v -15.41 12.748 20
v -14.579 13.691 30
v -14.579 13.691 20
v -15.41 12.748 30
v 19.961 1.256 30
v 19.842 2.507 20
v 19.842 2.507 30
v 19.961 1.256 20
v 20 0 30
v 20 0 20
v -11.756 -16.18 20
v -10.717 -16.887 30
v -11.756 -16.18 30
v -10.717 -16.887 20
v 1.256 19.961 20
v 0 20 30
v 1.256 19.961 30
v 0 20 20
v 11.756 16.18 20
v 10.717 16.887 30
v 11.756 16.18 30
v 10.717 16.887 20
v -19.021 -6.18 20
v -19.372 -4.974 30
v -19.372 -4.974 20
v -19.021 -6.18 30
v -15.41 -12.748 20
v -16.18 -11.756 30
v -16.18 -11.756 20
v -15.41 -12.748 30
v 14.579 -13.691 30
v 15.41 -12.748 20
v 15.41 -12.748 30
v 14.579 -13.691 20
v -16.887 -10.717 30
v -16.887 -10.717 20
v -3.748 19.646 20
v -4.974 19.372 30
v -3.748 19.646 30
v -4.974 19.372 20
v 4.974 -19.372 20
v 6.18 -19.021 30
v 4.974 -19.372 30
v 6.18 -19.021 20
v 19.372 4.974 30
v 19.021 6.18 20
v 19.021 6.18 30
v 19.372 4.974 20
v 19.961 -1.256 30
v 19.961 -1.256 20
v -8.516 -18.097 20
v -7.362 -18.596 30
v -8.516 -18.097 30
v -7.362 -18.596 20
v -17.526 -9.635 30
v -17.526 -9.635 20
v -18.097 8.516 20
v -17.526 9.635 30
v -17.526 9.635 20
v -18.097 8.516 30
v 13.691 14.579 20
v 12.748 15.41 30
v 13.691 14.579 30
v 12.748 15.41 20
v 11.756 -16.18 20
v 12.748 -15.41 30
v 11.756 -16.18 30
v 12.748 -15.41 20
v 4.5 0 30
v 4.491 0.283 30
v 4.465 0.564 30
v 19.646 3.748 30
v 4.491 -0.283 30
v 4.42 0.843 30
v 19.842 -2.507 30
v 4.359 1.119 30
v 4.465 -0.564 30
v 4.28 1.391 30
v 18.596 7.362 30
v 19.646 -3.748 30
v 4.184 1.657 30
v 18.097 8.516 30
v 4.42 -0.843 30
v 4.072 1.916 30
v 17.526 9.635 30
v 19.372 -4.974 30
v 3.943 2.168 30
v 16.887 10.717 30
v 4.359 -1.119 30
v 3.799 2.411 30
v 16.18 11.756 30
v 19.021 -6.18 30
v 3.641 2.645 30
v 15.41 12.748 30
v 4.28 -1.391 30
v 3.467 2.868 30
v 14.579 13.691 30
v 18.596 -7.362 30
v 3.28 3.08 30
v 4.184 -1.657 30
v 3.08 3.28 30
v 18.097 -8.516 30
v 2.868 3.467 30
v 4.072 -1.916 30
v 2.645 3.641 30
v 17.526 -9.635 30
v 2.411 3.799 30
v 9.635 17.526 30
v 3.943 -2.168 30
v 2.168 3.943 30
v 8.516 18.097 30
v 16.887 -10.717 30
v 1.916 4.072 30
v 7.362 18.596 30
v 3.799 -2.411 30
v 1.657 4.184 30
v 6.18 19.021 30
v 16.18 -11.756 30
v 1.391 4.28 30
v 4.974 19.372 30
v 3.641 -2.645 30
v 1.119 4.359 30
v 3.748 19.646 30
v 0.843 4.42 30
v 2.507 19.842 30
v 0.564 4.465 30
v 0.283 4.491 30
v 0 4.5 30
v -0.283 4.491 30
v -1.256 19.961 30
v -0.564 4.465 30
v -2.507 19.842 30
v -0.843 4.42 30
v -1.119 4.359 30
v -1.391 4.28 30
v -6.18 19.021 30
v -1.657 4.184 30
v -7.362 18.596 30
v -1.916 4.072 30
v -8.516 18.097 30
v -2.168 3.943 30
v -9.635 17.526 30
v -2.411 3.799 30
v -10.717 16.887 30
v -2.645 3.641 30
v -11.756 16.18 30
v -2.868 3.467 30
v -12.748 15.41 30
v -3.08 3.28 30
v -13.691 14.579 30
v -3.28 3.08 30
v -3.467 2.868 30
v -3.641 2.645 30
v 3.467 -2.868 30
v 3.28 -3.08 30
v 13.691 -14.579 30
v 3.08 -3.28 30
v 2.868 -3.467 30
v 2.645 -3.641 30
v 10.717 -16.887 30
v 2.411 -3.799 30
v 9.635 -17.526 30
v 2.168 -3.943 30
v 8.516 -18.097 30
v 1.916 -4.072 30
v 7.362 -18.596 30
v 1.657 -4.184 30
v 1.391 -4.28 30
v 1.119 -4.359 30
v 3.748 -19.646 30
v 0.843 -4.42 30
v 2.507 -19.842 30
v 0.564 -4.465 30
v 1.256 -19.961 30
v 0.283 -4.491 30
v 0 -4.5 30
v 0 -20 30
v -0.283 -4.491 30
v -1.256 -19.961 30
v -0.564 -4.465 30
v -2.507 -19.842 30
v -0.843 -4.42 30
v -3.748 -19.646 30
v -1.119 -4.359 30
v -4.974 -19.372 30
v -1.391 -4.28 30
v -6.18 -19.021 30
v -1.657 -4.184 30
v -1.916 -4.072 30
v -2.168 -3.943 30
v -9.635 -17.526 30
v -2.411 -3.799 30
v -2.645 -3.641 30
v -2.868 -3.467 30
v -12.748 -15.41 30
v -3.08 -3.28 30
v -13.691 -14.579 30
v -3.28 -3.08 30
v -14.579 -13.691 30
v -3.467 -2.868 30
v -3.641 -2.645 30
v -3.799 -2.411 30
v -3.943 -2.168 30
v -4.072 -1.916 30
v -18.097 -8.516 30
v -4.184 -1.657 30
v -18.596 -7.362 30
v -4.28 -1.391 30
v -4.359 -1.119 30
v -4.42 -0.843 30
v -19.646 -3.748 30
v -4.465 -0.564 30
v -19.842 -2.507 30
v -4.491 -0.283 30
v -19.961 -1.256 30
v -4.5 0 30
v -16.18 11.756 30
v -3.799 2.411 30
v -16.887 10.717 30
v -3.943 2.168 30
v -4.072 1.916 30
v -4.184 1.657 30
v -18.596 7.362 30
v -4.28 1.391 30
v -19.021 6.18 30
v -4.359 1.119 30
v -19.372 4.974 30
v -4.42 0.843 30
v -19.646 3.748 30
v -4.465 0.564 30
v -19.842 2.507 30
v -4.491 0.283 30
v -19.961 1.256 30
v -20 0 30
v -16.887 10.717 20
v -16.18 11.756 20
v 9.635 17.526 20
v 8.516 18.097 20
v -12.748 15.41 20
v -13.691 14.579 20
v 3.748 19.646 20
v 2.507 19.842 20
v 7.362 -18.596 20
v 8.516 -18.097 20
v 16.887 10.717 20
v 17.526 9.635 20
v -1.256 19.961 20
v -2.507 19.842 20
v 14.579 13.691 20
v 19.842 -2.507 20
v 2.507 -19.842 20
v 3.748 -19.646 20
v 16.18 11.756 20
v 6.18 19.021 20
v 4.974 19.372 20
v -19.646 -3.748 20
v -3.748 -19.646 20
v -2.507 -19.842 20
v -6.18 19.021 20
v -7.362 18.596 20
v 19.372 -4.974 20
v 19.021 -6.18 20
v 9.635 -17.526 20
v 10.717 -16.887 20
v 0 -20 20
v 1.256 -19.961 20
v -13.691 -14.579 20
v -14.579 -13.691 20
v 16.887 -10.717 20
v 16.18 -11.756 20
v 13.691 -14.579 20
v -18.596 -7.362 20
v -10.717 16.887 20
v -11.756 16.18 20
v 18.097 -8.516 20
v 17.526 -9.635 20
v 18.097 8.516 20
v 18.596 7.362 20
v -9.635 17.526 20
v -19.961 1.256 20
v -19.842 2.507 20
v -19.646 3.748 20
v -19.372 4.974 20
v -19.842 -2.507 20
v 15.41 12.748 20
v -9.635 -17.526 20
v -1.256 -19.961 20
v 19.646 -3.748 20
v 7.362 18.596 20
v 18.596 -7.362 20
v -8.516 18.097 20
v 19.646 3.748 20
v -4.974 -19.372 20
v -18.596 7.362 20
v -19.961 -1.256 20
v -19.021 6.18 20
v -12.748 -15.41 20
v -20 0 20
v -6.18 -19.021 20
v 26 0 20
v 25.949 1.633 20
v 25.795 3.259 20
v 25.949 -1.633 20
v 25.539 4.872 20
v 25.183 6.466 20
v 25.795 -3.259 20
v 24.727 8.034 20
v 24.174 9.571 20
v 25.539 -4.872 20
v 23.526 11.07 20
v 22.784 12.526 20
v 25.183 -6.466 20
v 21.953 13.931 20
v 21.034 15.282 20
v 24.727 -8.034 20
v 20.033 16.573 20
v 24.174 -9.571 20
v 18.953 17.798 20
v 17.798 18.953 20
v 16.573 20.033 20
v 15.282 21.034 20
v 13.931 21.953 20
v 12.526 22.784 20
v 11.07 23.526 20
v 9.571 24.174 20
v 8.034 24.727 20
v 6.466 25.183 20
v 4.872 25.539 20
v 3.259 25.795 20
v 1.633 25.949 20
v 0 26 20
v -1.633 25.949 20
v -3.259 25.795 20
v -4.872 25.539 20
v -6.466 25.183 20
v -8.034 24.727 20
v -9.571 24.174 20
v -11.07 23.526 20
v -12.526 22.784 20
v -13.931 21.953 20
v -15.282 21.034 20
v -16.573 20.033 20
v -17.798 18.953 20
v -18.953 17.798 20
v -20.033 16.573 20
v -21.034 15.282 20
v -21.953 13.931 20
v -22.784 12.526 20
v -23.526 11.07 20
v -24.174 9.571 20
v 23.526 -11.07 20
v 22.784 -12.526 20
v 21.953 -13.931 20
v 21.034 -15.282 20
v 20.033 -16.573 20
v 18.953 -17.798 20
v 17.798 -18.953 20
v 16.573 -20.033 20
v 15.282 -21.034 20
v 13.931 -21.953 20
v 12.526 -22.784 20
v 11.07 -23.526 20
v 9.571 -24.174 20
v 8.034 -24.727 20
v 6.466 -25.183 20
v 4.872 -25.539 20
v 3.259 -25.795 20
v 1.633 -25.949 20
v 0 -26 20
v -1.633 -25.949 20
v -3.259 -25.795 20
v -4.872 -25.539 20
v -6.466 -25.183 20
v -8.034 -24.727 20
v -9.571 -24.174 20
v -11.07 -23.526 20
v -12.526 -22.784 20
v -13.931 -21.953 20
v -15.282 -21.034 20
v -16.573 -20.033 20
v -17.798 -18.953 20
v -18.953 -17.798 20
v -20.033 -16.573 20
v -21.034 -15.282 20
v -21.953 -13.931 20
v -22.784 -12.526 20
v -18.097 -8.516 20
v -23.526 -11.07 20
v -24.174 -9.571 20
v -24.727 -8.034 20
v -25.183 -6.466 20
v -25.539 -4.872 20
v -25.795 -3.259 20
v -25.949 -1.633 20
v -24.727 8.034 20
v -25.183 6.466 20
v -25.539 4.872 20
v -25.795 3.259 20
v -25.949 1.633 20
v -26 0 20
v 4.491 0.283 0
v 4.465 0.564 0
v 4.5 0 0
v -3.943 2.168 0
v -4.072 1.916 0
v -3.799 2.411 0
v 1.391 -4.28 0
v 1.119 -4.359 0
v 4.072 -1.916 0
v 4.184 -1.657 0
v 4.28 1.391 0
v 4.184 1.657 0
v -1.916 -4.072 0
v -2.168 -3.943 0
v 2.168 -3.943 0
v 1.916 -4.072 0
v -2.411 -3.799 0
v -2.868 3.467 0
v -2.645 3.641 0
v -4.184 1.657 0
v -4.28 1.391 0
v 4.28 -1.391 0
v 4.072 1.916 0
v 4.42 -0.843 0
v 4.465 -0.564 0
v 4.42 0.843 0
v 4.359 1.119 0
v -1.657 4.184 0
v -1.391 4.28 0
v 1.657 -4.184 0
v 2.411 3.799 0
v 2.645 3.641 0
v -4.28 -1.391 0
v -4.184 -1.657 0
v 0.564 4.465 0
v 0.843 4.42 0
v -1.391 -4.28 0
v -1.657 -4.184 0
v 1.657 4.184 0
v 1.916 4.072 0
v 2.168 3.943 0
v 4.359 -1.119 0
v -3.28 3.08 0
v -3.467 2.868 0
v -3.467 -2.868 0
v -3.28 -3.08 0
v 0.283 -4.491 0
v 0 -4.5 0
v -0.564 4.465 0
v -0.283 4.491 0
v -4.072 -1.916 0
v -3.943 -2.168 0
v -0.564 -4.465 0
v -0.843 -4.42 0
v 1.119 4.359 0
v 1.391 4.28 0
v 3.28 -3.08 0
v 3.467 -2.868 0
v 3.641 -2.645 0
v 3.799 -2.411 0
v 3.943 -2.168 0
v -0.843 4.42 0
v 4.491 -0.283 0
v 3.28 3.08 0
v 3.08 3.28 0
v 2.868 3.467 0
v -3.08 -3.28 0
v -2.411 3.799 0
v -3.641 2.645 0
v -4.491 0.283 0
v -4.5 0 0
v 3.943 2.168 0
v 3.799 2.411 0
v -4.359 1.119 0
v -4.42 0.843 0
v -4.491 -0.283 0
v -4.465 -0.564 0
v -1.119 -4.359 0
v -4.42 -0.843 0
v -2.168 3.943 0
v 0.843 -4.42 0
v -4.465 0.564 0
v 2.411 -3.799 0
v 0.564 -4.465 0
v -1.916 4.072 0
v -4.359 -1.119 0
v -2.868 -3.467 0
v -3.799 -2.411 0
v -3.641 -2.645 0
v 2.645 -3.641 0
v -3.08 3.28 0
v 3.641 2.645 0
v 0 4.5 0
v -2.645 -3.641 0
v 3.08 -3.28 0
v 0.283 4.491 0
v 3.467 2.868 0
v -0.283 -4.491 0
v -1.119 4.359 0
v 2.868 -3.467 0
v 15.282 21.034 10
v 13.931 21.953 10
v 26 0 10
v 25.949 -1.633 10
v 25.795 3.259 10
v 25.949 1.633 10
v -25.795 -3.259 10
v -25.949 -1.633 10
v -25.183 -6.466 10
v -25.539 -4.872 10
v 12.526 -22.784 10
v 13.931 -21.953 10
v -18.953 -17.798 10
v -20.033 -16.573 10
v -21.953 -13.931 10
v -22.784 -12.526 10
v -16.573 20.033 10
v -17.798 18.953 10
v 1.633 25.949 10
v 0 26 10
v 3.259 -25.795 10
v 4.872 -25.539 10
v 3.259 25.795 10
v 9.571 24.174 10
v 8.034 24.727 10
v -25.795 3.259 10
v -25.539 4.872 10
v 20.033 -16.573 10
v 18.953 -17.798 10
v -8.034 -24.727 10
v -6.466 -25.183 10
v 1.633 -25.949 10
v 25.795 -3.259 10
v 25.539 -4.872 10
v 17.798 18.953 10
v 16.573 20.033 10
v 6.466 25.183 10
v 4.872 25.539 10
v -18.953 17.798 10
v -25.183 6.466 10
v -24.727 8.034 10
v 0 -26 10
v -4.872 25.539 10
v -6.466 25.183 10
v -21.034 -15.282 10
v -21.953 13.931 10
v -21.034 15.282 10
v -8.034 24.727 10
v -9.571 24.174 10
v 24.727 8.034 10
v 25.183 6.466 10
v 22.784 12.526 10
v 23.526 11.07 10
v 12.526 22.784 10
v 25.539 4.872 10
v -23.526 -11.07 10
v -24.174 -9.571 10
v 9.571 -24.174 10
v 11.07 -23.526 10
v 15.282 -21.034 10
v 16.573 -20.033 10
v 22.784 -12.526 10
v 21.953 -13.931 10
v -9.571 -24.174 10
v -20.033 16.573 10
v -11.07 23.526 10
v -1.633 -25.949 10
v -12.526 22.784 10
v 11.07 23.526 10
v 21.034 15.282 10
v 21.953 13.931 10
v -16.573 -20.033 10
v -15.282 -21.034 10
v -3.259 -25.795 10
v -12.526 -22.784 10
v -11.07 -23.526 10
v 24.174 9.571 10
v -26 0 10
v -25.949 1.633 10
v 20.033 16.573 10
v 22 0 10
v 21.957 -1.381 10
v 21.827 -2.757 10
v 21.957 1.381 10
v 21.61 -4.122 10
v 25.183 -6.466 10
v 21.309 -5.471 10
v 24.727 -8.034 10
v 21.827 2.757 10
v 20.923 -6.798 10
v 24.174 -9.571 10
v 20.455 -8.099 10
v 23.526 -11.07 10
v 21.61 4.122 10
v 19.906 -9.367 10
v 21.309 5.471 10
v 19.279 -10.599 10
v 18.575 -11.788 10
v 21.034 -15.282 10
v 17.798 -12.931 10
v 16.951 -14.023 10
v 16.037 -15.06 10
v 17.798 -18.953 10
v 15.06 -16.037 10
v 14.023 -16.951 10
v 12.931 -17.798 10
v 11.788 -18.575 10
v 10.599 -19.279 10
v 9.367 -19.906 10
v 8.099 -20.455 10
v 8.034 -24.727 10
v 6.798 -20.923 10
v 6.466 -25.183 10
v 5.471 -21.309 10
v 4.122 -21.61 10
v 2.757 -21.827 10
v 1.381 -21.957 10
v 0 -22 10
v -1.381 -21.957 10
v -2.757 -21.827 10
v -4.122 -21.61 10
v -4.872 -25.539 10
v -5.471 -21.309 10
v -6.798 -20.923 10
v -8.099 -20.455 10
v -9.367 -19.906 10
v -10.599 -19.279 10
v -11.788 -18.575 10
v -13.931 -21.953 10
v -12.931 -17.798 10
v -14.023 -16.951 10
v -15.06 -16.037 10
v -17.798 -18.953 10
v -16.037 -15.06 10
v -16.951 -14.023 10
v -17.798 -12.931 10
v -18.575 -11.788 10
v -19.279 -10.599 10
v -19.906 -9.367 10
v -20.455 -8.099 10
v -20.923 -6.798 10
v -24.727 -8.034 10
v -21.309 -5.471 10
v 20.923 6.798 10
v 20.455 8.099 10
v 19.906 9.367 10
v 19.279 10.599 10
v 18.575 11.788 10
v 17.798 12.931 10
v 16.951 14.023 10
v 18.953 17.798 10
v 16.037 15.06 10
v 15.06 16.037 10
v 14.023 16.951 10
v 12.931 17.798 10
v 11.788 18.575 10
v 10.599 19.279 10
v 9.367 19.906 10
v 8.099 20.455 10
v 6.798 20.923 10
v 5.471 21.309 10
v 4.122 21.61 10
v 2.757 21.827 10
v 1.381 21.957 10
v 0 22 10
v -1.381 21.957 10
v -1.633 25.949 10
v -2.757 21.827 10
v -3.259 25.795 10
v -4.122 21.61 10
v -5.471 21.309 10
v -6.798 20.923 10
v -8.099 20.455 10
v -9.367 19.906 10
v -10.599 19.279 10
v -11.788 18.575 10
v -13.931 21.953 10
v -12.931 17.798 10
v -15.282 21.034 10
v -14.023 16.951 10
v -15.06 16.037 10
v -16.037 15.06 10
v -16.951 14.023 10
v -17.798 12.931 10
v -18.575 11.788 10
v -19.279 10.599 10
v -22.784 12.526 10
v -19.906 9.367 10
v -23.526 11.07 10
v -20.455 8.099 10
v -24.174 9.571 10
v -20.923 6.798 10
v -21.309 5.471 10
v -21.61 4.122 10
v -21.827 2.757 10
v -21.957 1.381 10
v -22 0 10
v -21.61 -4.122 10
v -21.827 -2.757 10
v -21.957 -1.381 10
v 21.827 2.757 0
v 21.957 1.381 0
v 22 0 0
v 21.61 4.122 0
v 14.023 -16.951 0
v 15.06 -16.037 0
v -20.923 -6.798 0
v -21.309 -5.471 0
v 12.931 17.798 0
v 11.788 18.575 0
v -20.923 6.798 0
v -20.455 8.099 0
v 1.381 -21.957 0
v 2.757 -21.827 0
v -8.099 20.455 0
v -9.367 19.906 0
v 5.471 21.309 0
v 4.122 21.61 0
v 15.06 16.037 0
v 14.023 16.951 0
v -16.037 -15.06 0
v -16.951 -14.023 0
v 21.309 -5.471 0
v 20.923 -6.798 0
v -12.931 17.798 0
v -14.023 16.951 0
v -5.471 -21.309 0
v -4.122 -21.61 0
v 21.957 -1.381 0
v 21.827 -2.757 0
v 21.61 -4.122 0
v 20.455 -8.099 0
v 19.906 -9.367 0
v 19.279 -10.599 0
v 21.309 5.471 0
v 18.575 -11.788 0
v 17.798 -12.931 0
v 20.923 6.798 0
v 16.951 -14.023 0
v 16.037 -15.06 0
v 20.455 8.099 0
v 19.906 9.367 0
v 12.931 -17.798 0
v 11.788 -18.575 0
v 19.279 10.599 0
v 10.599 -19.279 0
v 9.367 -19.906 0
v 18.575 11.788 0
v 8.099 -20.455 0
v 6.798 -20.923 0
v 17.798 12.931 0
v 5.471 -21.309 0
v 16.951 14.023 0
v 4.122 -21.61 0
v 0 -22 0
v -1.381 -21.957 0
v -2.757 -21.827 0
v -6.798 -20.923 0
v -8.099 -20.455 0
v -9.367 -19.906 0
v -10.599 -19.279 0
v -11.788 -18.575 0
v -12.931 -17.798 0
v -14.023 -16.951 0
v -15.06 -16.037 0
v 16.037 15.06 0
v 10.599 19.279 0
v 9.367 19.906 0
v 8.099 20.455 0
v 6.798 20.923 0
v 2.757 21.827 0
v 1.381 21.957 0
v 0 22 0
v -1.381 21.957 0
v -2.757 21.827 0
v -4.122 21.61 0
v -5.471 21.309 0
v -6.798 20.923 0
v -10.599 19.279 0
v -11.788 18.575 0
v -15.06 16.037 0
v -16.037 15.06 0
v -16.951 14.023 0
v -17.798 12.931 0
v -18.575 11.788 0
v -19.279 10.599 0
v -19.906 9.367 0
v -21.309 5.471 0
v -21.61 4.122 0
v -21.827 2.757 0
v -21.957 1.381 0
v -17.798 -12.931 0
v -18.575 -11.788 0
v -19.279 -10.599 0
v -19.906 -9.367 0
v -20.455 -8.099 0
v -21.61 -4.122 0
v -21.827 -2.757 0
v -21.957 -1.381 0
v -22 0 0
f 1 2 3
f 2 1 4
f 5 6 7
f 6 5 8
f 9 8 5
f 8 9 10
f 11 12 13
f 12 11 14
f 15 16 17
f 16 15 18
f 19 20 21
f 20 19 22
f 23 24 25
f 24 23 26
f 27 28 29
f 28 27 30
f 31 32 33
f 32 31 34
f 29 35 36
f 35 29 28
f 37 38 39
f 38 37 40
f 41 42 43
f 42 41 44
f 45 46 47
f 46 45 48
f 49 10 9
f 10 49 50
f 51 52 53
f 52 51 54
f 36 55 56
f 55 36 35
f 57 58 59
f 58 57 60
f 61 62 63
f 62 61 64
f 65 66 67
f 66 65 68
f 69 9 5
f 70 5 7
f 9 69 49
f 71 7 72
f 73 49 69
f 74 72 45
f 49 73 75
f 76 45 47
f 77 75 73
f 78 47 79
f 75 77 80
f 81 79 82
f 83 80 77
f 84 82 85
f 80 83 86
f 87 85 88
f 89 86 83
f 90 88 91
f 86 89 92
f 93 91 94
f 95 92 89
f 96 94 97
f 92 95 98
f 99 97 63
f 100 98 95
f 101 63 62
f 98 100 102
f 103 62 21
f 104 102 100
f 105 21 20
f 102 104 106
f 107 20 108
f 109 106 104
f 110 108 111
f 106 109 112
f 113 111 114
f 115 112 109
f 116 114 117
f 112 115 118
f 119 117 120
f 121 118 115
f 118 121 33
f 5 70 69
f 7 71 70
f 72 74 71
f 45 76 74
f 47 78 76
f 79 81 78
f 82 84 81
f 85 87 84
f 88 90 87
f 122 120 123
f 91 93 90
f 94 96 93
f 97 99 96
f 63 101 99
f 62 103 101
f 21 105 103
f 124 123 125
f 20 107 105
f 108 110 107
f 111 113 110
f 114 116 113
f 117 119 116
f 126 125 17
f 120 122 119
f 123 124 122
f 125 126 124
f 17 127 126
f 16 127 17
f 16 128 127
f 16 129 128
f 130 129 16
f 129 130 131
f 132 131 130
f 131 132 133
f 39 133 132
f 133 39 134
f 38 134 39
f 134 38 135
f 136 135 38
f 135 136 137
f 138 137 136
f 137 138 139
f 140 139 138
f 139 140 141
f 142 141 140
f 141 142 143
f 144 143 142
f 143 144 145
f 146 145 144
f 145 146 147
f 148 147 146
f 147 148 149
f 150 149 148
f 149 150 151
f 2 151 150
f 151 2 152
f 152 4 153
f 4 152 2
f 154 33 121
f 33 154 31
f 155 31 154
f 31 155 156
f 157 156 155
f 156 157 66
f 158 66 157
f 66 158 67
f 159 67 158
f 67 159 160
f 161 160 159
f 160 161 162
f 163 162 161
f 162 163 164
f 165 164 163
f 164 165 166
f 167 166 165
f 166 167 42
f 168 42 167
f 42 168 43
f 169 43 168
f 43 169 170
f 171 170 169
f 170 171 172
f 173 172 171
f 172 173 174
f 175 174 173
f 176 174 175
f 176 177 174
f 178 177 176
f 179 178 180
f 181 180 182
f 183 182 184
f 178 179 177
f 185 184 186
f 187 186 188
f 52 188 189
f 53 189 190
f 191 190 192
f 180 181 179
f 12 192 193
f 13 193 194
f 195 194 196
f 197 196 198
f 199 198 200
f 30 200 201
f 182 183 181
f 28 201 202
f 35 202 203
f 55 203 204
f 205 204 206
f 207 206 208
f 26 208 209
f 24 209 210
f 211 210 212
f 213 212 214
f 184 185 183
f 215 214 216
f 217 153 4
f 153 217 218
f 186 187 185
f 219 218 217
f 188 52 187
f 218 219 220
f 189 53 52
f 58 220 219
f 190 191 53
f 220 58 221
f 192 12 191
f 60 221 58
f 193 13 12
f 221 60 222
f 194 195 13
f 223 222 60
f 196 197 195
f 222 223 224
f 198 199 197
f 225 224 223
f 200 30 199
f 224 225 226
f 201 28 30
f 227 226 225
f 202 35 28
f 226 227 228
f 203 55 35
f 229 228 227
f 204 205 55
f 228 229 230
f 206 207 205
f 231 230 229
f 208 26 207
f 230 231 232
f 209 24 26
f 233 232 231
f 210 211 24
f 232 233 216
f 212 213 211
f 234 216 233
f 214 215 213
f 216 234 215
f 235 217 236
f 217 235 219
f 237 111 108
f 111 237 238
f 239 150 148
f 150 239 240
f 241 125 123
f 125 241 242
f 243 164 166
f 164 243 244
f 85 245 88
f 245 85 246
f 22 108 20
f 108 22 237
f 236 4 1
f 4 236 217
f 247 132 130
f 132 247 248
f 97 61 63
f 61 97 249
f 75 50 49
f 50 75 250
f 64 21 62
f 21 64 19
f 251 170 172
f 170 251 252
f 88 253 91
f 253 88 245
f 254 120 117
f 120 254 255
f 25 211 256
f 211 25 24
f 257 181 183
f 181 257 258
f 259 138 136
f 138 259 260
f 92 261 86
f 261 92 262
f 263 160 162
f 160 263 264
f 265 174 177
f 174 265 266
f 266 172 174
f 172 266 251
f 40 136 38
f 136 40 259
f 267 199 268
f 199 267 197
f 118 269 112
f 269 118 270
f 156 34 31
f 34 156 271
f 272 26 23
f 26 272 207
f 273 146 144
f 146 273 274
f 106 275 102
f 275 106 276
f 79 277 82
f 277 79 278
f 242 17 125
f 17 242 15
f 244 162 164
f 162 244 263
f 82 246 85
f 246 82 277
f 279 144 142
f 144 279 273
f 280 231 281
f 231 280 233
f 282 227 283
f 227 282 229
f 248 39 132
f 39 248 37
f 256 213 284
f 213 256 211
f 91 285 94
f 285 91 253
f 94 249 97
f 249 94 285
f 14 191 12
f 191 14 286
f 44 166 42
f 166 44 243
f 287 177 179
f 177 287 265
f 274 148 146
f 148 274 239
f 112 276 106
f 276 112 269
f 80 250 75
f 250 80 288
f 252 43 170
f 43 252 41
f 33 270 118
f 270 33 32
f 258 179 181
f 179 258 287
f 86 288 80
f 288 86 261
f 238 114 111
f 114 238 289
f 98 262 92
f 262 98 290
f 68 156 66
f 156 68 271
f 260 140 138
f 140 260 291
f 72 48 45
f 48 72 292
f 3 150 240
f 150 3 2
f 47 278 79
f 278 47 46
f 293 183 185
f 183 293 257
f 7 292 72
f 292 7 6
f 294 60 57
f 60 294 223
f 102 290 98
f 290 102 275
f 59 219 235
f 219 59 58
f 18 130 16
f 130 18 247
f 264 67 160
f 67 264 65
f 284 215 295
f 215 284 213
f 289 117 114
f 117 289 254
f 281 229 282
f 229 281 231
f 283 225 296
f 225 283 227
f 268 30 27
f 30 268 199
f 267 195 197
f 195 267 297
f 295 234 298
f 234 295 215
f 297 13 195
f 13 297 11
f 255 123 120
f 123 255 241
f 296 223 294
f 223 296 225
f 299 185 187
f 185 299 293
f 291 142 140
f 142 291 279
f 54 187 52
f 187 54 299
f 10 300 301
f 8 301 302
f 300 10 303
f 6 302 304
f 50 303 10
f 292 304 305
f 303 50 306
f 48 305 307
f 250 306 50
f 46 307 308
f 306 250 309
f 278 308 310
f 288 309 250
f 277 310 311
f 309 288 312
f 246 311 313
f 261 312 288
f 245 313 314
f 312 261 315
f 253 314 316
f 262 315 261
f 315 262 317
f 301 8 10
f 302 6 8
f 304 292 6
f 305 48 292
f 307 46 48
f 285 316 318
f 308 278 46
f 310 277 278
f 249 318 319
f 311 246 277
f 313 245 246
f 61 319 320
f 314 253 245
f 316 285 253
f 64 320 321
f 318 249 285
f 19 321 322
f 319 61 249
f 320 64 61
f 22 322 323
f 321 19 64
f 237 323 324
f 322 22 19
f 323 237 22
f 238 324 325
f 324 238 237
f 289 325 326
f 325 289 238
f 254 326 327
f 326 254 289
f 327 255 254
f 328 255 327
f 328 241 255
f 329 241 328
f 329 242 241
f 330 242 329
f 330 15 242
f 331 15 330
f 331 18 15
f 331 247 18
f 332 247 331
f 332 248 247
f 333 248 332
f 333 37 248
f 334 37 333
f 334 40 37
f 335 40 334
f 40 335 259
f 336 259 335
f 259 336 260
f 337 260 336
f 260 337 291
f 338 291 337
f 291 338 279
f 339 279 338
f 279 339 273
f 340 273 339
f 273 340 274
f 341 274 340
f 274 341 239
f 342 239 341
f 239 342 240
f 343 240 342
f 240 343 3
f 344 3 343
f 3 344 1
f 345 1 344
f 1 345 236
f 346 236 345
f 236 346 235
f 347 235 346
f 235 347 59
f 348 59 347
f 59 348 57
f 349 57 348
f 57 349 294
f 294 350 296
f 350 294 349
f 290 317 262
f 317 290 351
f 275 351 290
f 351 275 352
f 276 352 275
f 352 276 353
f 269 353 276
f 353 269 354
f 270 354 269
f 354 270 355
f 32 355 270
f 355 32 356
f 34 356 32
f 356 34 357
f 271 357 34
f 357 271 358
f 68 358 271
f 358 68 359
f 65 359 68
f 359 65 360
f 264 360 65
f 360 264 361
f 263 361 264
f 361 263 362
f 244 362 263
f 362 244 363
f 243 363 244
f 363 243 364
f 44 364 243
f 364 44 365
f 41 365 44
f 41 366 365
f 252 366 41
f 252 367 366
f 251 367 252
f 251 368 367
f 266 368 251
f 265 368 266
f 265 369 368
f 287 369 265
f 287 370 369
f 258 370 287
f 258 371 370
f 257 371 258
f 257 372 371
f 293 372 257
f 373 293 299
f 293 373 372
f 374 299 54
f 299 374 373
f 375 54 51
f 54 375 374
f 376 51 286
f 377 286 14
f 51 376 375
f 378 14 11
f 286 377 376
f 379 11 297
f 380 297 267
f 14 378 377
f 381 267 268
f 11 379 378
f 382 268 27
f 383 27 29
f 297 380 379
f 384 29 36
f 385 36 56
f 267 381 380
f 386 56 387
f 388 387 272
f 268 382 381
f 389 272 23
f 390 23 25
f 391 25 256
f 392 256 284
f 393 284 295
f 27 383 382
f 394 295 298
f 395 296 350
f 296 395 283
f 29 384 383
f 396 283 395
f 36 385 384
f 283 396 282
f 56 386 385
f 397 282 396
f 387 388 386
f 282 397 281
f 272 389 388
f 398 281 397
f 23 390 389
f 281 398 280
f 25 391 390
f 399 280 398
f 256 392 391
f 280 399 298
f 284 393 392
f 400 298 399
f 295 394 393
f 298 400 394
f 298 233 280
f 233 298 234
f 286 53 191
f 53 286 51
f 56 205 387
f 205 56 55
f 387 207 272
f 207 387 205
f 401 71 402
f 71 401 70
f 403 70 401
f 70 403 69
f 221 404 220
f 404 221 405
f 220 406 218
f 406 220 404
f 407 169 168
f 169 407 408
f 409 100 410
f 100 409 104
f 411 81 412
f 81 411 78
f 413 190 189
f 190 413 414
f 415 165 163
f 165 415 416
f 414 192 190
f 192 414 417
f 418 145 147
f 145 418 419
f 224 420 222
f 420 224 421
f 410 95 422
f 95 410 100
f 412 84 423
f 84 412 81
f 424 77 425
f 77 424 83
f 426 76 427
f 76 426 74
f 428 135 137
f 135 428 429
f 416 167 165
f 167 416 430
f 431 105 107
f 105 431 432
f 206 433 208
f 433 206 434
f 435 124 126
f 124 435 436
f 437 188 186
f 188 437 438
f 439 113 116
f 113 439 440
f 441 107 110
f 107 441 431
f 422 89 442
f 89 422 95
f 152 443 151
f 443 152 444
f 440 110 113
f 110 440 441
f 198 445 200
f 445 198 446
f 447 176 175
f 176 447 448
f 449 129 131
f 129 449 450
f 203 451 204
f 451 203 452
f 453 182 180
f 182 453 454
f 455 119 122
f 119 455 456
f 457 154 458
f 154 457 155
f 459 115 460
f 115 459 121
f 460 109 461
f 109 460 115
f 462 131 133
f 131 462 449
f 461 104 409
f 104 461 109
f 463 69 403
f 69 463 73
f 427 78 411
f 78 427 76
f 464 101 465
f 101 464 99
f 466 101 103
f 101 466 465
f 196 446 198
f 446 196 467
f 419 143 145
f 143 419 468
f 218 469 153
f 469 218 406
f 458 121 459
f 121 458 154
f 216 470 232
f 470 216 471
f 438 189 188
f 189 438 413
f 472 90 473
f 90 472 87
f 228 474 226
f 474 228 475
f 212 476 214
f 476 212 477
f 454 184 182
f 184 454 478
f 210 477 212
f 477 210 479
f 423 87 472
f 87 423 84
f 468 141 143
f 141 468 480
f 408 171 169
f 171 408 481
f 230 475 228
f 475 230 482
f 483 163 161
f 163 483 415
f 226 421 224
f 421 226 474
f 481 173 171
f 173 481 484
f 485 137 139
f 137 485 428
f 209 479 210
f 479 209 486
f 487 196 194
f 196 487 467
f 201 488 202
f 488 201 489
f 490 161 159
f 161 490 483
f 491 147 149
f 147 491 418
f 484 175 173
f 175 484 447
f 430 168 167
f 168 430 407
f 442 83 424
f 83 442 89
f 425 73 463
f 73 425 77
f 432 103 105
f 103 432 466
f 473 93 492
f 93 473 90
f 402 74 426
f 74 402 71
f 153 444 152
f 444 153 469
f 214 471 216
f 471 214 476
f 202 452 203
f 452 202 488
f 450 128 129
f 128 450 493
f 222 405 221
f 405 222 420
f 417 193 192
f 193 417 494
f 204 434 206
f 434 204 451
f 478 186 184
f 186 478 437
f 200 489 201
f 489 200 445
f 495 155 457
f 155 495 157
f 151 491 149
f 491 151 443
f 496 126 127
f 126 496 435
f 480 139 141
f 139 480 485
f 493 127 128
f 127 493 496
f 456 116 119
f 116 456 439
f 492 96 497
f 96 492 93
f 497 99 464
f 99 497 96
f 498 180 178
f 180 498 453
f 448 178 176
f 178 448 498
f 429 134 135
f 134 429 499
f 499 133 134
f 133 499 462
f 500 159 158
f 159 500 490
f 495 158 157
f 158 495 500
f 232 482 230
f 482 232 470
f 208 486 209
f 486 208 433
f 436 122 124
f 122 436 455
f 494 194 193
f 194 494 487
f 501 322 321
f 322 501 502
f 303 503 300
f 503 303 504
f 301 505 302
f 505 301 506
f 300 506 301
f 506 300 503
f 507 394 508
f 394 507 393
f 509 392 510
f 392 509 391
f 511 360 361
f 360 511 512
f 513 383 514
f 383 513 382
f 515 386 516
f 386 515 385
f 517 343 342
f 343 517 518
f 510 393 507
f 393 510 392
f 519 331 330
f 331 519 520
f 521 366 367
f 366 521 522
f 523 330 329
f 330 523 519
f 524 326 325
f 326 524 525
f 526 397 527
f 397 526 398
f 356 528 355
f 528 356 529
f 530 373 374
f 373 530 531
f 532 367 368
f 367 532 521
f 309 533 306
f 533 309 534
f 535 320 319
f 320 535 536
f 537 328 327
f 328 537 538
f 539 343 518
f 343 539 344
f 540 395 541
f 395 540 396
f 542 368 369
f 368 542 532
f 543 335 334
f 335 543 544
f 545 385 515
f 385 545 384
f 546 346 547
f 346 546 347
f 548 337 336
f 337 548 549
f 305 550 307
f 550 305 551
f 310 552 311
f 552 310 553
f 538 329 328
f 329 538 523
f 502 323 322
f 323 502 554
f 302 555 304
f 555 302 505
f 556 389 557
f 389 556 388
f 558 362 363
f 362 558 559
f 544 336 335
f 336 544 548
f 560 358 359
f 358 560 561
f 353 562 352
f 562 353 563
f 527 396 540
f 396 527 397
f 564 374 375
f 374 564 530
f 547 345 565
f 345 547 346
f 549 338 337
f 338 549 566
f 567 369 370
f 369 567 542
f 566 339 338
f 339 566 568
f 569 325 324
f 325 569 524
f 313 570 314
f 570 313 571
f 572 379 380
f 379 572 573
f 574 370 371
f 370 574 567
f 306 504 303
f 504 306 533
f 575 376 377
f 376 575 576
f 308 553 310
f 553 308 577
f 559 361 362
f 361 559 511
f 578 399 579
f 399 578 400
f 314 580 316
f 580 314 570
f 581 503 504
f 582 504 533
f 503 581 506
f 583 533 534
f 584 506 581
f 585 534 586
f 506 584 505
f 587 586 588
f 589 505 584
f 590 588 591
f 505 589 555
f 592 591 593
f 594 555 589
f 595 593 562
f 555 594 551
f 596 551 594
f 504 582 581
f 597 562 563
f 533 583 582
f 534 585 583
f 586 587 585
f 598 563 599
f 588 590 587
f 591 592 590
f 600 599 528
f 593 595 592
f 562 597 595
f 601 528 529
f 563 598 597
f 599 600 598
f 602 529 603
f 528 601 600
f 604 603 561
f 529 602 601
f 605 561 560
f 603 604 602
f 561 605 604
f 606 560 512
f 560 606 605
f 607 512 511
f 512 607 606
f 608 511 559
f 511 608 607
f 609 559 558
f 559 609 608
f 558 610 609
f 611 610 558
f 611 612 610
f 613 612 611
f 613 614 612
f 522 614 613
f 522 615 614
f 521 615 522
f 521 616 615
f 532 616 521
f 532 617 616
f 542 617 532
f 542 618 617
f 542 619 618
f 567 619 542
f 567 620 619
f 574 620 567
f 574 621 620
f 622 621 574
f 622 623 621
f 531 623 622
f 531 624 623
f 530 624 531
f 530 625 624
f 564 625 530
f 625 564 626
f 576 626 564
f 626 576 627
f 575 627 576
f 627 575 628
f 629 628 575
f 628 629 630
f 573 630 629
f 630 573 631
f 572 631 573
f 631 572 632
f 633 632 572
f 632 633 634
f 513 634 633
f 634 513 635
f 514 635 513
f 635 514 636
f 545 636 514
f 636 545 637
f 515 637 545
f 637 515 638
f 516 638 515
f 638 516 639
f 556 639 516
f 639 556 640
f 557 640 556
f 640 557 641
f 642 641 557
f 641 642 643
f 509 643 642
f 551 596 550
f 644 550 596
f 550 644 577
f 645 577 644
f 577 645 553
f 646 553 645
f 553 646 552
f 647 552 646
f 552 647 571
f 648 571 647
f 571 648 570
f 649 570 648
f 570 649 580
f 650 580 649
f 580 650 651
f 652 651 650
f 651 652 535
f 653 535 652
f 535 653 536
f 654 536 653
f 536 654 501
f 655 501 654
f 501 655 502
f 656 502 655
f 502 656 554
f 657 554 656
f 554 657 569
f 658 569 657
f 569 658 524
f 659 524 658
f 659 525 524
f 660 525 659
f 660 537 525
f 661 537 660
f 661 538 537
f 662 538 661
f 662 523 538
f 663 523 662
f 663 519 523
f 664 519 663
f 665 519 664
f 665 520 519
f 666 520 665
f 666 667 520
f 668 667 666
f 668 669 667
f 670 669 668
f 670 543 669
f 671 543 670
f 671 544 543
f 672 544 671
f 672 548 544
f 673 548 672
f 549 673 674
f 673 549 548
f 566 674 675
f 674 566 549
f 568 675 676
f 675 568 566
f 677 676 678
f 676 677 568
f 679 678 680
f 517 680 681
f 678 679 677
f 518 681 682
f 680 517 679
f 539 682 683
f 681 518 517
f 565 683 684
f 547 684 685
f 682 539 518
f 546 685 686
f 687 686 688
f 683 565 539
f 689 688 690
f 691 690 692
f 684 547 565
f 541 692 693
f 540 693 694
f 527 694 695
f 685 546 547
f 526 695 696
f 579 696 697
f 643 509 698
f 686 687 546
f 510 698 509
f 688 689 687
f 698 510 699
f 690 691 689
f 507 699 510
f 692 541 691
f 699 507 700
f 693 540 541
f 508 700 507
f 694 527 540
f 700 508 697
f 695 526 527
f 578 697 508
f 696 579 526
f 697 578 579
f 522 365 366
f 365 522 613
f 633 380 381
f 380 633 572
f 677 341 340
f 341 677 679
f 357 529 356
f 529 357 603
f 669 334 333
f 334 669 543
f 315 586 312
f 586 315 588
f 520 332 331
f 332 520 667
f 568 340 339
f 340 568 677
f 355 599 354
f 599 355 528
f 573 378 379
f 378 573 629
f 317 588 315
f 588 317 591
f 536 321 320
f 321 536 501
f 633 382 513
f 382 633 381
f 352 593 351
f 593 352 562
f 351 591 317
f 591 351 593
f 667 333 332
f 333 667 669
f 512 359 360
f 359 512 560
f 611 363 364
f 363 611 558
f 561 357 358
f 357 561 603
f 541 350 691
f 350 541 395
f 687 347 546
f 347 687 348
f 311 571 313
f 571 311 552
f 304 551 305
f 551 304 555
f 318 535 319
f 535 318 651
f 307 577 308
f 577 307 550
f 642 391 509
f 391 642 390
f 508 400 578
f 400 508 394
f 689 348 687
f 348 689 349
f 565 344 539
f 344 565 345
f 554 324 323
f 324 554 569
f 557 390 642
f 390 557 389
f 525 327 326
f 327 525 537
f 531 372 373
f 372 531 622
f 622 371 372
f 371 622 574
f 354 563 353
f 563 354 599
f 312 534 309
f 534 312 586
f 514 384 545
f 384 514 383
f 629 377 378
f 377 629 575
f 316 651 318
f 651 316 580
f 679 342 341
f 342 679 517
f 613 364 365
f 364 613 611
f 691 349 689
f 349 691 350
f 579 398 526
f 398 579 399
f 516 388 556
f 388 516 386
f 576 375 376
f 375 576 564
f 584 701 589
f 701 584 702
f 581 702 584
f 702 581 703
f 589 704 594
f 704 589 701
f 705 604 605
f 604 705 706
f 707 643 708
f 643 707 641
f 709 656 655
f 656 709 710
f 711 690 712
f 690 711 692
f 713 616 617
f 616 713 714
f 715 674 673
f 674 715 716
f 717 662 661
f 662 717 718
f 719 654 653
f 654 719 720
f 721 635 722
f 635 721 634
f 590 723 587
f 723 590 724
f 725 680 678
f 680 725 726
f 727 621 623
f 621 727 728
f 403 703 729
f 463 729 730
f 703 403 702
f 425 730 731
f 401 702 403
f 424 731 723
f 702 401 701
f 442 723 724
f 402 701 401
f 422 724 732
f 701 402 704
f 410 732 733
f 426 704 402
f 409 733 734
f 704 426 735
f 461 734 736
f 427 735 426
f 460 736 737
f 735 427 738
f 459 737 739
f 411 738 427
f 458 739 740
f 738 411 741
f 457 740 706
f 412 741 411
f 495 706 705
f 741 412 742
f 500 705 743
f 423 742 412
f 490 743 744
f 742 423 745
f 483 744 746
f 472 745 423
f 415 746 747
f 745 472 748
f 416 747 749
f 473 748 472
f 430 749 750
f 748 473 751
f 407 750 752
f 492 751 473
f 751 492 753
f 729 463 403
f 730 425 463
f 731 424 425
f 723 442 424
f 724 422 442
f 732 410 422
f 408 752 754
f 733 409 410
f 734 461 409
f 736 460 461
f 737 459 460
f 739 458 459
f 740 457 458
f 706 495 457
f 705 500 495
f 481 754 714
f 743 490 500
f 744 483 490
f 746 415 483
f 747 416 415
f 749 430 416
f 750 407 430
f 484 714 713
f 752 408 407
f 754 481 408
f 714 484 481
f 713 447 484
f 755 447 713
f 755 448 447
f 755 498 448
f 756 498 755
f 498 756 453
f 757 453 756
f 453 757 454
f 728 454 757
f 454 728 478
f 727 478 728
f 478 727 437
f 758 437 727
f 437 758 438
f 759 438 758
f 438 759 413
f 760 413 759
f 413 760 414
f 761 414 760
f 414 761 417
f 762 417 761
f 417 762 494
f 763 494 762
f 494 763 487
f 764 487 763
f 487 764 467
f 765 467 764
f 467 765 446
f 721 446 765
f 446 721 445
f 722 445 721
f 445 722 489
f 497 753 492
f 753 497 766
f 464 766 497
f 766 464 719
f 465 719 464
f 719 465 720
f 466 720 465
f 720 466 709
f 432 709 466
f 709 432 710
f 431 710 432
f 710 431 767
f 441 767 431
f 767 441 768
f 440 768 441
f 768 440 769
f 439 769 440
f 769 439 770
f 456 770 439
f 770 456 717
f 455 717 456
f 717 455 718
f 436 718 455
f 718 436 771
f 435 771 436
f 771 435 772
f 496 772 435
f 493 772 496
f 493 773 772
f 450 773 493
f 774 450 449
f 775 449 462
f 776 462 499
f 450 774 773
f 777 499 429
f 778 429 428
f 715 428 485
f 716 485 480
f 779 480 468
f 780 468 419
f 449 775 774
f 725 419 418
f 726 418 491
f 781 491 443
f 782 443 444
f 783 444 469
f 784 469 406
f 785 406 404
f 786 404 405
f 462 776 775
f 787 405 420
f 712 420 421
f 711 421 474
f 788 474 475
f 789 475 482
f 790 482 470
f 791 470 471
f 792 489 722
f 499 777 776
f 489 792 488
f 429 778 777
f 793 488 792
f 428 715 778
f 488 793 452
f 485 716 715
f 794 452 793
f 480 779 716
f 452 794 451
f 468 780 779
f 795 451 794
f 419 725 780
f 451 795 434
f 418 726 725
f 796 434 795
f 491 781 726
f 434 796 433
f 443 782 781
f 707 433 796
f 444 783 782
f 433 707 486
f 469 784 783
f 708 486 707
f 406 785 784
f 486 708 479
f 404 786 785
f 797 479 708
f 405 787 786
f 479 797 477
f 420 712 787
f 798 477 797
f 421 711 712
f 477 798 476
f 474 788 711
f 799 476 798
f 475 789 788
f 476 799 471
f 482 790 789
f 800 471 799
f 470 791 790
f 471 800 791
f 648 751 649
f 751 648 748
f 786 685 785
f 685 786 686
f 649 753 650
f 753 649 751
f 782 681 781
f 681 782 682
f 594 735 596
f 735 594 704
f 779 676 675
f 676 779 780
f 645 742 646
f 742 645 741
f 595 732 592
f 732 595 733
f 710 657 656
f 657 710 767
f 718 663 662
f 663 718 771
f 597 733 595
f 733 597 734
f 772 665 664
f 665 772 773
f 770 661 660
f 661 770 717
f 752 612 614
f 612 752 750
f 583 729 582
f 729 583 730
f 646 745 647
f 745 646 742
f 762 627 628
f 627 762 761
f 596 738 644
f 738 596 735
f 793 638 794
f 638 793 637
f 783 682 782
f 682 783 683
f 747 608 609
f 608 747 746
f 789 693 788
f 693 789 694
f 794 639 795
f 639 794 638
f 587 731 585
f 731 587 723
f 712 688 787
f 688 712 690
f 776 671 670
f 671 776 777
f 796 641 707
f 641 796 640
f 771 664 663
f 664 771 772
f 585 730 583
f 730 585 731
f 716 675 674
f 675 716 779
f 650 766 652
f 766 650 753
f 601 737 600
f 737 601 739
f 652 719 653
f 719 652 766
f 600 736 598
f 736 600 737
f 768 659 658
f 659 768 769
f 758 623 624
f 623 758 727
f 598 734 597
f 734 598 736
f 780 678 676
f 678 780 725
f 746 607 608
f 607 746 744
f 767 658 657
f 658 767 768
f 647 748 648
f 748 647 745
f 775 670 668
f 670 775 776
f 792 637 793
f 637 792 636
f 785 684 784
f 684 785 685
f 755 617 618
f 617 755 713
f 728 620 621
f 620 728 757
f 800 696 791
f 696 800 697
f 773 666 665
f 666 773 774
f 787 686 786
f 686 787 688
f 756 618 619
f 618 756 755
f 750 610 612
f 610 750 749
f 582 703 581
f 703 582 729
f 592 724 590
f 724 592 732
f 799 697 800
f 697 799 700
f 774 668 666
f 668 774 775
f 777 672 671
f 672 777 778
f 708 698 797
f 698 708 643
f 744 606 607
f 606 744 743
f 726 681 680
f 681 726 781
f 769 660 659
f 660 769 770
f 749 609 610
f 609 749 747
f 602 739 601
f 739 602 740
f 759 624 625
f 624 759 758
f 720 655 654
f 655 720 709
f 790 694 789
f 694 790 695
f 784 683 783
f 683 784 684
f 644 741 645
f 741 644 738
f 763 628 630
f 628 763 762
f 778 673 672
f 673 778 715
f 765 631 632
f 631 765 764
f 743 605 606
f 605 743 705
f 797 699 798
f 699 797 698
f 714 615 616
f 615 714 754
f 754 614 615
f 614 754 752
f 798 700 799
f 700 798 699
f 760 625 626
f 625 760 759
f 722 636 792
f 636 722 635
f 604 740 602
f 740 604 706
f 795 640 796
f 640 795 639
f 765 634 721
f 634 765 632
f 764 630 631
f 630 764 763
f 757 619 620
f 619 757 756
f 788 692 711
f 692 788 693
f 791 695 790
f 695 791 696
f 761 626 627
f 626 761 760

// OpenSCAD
// file: ../../../../../../../../shapes/open-cylinder/open-cylinder.scad
// TODO: Lower this to 50.
module openCylinder(height = 3,
                    outerRadius = 7,
                    innerRadius = 4.5,
                    fn = 100)
{
    $fn = fn;

    difference()
    {
        cylinder(r=outerRadius,
                 h=height);

        translate([0, 0, -1])
        cylinder(r=innerRadius,
                 h=height+1.01);
    }
}
// file: ../../../../../variable-diameter-round-connector.scad
use <../../../shapes/open-cylinder/open-cylinder.scad>

module roundConnector(bottomHeight = 10,
					  bottomInnerRadius = 4.5,
					  bottomOuterRadius = 7,
					  middleHeight = 10,
					  middleInnerRadius = 4.5,
					  middleOuterRadius = 15,
					  topHeight = 10,
					  topInnerRadius = 4.5,
				  	  topOuterRadius = 7)
{
	union()
	{
		color("teal")
		translate([0, 0, bottomHeight + middleHeight])
		roundConnector_top(height = topHeight,
						   innerRadius = topInnerRadius,
						   outerRadius = topOuterRadius);

		color("magenta")
		translate([0, 0, bottomHeight])
		roundConnector_middle(height = middleHeight,
							  innerRadius = middleInnerRadius,
							  outerRadius = middleOuterRadius);

		color("blue")
		roundConnector_Bottom(height = bottomHeight,
							  innerRadius = bottomInnerRadius,
							  outerRadius = bottomOuterRadius);
	}
}

module roundConnector_top(height, innerRadius, outerRadius)
{
	openCylinder(height = height,
				 innerRadius = innerRadius,
				 outerRadius = outerRadius);
}

module roundConnector_middle(height, innerRadius, outerRadius)
{
	openCylinder(height = height,
				 innerRadius = innerRadius,
				 outerRadius = outerRadius);
}

module roundConnector_Bottom(height, innerRadius, outerRadius)
{
	openCylinder(height = height,
				 innerRadius = innerRadius,
				 outerRadius = outerRadius);
}
// main file
use <../../../../../variable-diameter-round-connector.scad>

roundConnector(bottomOuterRadius = 22,
			   middleOuterRadius = 26,
		   	   topOuterRadius = 20);
